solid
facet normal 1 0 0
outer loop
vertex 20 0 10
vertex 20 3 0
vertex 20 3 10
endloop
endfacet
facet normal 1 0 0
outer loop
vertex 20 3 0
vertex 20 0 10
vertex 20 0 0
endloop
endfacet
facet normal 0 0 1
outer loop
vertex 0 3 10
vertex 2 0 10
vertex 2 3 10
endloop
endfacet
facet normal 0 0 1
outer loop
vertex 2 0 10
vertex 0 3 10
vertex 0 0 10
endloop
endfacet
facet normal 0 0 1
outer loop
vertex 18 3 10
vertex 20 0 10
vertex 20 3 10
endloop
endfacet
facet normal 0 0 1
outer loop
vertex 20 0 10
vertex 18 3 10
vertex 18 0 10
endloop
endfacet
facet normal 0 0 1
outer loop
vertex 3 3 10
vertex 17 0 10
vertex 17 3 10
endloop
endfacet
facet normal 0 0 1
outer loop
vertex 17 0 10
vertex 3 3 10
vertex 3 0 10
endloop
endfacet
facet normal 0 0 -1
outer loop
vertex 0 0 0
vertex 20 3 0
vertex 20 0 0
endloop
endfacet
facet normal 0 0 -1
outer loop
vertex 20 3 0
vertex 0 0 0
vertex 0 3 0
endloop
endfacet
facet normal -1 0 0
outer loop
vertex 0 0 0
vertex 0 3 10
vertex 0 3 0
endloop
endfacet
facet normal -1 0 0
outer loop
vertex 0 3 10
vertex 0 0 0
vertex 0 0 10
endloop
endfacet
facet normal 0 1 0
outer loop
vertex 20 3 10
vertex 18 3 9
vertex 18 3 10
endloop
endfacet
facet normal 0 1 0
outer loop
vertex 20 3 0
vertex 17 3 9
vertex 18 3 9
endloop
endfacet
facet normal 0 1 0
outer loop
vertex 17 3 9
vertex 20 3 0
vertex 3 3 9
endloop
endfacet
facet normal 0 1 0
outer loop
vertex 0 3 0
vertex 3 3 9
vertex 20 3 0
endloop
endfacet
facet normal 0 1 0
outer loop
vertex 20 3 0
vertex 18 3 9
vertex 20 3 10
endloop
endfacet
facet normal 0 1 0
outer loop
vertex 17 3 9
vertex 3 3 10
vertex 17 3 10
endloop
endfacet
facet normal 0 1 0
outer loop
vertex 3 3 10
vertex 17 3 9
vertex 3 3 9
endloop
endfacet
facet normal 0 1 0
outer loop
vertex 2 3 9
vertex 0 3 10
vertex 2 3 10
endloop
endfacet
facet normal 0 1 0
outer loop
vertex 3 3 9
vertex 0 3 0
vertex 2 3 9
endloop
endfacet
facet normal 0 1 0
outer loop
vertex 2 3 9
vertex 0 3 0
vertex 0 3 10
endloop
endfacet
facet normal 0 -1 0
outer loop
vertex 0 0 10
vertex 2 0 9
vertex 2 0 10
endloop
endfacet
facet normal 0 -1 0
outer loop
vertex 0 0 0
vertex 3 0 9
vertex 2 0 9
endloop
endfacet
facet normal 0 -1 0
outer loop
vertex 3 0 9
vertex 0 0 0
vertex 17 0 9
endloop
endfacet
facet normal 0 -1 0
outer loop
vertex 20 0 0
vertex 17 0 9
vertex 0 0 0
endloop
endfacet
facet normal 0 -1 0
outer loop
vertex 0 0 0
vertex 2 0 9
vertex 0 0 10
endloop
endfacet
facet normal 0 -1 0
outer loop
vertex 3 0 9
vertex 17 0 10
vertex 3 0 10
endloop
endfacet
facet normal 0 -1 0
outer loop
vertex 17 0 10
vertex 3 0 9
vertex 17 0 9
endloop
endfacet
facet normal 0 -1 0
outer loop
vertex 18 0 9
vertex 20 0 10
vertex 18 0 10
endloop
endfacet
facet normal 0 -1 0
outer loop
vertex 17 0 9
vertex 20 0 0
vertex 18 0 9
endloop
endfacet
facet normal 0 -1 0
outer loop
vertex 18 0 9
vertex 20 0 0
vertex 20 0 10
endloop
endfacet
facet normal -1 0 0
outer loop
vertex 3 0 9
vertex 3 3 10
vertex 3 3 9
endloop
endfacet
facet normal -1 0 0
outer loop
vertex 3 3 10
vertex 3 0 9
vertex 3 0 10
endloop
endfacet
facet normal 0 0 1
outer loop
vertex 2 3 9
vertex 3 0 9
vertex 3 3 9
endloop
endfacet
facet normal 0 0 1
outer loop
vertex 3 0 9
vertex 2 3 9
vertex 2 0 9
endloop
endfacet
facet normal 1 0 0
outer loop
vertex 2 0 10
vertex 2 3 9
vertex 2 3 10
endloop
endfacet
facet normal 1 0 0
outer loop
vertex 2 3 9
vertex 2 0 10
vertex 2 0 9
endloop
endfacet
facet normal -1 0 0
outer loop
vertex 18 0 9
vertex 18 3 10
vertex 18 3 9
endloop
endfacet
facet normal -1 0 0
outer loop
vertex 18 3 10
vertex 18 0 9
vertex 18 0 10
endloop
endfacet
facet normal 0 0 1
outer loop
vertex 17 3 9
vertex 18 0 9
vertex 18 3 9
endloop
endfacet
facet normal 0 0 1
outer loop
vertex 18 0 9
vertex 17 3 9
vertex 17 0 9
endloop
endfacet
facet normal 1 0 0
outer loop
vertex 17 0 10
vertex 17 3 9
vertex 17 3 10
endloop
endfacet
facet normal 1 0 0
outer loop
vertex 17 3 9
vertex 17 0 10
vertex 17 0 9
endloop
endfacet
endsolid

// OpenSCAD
// file: Block.scad
// Copyright Stephen Morrisson 2018
// All rights reserved


module cBlock(c, Size)
{
    color(c)
        cube(Size);
}
//cBlock("blue", [2,3,4]);

module tBlock(c, Offset, Size)
{
    translate(Offset) cBlock(c, Size);
}
//tBlock("green", [10,20,1], [2,4,6]);

module rBlock(c, Rot, Size)
{
    rotate(Rot) cBlock(c, Size);
}
//rBlock("blue", [45,90,135], [2,4,6]);

module trBlock(c, Offset, Rot, Size)
{
    translate(Offset) rBlock(c, Rot, Size);
}
//trBlock("blue", [1,2,3], [45,90,135], [2,4,6]);


module testBlocks()
{
    Sz = [8, 4, 1];

    trBlock("orange", [20,0,0],  [0,0,0], Sz);
    trBlock("blue", [10, -10, 0], [0, 90, 0], Sz);
    trBlock("gray", [-10, 10, 0], [0,0,90], Sz);
    trBlock("yellow", [0,0,0], [90,0,0], Sz);
    trBlock("green", [-20,-20,0], [90,270,45], Sz);
}

testBlocks();
// main file
// Copyright Stephen Morrisson 2018
// All rights reserved

use <Block.scad>

// Size: size of bar
// NO Notch offset from low end,
// NS Notch size 

// test stuff
tSize = [20,3,10];

module cBarNotched(c, Size, xNO, xNS, zNS)
{
    ccBarNotched(c,c,Size, xNO, xNS, zNS);
}
//cBarNotched("red", tSize, 2, 1, 1);

module cNotch(c, Size, xNO, xNS, zNS)
{
    yS = Size[1];
    zS = Size[2];
    tBlock(c, [xNO, -1, zS - zNS], [xNS, yS + 2, zNS + 1]);
}

module ccBarNotched(c1, c2, Size, xNO, xNS, zNS)
{
    difference()
    {
	cBlock(c1, Size);
	cNotch(c2, Size, xNO, xNS, zNS);
    }
}
//ccBarNotched("yellow", "red", tSize, 2, 3, 4);


module tBarNotched(c, Offset, Size, xNO, xNS, zNS)
{
    translate(Offset) ccBarNotched(c, "red", Size, xNO, xNS, zNS);
}
//tBarNotched("green", [-10,-10,-10], tSize, 2, 3, 4);
//tBarNotched("yellow", [0,0,0], tSize, 2, 3, 4);


module trBarNotched(c, Offset, Rot, Size, xNO, xNS, zNS)
{
    rotate(Offset) tBarNotched(c, Offset, Size, xNO, xNS, zNS);
}
//trBarNotched("blue", [0,0,0], [0,0,0], tSize, 2, 3, 4);


module trBarNotchedTwiceFromEnds(c, Offset, Rot, Size,
     xNO1, xNS1, zNS1, xNO2, xNS2, zNS2)
{
    xS = Size[0];
    translate(Offset) rotate(Rot)
    {
        difference()
	{
	    cBarNotched(c, Size, xNO1, xNS1, zNS1);
	    cNotch("red", Size, xS - xNO2 - xNS2, xNS2, zNS2);
        }
    }
}
//trBarNotchedTwiceFromEnds("yellow", [0,0,0], [0,0,45], tSize, 2,1,1, 3,2,2);

module trBarNotchedBoth(c, Offset, Rot, Size, xNO, xNS, zNS)
{
    trBarNotchedTwiceFromEnds(c, Offset, Rot, Size,
    				 xNO, xNS, zNS, xNO, xNS, zNS);
}
trBarNotchedBoth("blue", [0,0,0], [0,0,0], tSize, 2,1,1);
